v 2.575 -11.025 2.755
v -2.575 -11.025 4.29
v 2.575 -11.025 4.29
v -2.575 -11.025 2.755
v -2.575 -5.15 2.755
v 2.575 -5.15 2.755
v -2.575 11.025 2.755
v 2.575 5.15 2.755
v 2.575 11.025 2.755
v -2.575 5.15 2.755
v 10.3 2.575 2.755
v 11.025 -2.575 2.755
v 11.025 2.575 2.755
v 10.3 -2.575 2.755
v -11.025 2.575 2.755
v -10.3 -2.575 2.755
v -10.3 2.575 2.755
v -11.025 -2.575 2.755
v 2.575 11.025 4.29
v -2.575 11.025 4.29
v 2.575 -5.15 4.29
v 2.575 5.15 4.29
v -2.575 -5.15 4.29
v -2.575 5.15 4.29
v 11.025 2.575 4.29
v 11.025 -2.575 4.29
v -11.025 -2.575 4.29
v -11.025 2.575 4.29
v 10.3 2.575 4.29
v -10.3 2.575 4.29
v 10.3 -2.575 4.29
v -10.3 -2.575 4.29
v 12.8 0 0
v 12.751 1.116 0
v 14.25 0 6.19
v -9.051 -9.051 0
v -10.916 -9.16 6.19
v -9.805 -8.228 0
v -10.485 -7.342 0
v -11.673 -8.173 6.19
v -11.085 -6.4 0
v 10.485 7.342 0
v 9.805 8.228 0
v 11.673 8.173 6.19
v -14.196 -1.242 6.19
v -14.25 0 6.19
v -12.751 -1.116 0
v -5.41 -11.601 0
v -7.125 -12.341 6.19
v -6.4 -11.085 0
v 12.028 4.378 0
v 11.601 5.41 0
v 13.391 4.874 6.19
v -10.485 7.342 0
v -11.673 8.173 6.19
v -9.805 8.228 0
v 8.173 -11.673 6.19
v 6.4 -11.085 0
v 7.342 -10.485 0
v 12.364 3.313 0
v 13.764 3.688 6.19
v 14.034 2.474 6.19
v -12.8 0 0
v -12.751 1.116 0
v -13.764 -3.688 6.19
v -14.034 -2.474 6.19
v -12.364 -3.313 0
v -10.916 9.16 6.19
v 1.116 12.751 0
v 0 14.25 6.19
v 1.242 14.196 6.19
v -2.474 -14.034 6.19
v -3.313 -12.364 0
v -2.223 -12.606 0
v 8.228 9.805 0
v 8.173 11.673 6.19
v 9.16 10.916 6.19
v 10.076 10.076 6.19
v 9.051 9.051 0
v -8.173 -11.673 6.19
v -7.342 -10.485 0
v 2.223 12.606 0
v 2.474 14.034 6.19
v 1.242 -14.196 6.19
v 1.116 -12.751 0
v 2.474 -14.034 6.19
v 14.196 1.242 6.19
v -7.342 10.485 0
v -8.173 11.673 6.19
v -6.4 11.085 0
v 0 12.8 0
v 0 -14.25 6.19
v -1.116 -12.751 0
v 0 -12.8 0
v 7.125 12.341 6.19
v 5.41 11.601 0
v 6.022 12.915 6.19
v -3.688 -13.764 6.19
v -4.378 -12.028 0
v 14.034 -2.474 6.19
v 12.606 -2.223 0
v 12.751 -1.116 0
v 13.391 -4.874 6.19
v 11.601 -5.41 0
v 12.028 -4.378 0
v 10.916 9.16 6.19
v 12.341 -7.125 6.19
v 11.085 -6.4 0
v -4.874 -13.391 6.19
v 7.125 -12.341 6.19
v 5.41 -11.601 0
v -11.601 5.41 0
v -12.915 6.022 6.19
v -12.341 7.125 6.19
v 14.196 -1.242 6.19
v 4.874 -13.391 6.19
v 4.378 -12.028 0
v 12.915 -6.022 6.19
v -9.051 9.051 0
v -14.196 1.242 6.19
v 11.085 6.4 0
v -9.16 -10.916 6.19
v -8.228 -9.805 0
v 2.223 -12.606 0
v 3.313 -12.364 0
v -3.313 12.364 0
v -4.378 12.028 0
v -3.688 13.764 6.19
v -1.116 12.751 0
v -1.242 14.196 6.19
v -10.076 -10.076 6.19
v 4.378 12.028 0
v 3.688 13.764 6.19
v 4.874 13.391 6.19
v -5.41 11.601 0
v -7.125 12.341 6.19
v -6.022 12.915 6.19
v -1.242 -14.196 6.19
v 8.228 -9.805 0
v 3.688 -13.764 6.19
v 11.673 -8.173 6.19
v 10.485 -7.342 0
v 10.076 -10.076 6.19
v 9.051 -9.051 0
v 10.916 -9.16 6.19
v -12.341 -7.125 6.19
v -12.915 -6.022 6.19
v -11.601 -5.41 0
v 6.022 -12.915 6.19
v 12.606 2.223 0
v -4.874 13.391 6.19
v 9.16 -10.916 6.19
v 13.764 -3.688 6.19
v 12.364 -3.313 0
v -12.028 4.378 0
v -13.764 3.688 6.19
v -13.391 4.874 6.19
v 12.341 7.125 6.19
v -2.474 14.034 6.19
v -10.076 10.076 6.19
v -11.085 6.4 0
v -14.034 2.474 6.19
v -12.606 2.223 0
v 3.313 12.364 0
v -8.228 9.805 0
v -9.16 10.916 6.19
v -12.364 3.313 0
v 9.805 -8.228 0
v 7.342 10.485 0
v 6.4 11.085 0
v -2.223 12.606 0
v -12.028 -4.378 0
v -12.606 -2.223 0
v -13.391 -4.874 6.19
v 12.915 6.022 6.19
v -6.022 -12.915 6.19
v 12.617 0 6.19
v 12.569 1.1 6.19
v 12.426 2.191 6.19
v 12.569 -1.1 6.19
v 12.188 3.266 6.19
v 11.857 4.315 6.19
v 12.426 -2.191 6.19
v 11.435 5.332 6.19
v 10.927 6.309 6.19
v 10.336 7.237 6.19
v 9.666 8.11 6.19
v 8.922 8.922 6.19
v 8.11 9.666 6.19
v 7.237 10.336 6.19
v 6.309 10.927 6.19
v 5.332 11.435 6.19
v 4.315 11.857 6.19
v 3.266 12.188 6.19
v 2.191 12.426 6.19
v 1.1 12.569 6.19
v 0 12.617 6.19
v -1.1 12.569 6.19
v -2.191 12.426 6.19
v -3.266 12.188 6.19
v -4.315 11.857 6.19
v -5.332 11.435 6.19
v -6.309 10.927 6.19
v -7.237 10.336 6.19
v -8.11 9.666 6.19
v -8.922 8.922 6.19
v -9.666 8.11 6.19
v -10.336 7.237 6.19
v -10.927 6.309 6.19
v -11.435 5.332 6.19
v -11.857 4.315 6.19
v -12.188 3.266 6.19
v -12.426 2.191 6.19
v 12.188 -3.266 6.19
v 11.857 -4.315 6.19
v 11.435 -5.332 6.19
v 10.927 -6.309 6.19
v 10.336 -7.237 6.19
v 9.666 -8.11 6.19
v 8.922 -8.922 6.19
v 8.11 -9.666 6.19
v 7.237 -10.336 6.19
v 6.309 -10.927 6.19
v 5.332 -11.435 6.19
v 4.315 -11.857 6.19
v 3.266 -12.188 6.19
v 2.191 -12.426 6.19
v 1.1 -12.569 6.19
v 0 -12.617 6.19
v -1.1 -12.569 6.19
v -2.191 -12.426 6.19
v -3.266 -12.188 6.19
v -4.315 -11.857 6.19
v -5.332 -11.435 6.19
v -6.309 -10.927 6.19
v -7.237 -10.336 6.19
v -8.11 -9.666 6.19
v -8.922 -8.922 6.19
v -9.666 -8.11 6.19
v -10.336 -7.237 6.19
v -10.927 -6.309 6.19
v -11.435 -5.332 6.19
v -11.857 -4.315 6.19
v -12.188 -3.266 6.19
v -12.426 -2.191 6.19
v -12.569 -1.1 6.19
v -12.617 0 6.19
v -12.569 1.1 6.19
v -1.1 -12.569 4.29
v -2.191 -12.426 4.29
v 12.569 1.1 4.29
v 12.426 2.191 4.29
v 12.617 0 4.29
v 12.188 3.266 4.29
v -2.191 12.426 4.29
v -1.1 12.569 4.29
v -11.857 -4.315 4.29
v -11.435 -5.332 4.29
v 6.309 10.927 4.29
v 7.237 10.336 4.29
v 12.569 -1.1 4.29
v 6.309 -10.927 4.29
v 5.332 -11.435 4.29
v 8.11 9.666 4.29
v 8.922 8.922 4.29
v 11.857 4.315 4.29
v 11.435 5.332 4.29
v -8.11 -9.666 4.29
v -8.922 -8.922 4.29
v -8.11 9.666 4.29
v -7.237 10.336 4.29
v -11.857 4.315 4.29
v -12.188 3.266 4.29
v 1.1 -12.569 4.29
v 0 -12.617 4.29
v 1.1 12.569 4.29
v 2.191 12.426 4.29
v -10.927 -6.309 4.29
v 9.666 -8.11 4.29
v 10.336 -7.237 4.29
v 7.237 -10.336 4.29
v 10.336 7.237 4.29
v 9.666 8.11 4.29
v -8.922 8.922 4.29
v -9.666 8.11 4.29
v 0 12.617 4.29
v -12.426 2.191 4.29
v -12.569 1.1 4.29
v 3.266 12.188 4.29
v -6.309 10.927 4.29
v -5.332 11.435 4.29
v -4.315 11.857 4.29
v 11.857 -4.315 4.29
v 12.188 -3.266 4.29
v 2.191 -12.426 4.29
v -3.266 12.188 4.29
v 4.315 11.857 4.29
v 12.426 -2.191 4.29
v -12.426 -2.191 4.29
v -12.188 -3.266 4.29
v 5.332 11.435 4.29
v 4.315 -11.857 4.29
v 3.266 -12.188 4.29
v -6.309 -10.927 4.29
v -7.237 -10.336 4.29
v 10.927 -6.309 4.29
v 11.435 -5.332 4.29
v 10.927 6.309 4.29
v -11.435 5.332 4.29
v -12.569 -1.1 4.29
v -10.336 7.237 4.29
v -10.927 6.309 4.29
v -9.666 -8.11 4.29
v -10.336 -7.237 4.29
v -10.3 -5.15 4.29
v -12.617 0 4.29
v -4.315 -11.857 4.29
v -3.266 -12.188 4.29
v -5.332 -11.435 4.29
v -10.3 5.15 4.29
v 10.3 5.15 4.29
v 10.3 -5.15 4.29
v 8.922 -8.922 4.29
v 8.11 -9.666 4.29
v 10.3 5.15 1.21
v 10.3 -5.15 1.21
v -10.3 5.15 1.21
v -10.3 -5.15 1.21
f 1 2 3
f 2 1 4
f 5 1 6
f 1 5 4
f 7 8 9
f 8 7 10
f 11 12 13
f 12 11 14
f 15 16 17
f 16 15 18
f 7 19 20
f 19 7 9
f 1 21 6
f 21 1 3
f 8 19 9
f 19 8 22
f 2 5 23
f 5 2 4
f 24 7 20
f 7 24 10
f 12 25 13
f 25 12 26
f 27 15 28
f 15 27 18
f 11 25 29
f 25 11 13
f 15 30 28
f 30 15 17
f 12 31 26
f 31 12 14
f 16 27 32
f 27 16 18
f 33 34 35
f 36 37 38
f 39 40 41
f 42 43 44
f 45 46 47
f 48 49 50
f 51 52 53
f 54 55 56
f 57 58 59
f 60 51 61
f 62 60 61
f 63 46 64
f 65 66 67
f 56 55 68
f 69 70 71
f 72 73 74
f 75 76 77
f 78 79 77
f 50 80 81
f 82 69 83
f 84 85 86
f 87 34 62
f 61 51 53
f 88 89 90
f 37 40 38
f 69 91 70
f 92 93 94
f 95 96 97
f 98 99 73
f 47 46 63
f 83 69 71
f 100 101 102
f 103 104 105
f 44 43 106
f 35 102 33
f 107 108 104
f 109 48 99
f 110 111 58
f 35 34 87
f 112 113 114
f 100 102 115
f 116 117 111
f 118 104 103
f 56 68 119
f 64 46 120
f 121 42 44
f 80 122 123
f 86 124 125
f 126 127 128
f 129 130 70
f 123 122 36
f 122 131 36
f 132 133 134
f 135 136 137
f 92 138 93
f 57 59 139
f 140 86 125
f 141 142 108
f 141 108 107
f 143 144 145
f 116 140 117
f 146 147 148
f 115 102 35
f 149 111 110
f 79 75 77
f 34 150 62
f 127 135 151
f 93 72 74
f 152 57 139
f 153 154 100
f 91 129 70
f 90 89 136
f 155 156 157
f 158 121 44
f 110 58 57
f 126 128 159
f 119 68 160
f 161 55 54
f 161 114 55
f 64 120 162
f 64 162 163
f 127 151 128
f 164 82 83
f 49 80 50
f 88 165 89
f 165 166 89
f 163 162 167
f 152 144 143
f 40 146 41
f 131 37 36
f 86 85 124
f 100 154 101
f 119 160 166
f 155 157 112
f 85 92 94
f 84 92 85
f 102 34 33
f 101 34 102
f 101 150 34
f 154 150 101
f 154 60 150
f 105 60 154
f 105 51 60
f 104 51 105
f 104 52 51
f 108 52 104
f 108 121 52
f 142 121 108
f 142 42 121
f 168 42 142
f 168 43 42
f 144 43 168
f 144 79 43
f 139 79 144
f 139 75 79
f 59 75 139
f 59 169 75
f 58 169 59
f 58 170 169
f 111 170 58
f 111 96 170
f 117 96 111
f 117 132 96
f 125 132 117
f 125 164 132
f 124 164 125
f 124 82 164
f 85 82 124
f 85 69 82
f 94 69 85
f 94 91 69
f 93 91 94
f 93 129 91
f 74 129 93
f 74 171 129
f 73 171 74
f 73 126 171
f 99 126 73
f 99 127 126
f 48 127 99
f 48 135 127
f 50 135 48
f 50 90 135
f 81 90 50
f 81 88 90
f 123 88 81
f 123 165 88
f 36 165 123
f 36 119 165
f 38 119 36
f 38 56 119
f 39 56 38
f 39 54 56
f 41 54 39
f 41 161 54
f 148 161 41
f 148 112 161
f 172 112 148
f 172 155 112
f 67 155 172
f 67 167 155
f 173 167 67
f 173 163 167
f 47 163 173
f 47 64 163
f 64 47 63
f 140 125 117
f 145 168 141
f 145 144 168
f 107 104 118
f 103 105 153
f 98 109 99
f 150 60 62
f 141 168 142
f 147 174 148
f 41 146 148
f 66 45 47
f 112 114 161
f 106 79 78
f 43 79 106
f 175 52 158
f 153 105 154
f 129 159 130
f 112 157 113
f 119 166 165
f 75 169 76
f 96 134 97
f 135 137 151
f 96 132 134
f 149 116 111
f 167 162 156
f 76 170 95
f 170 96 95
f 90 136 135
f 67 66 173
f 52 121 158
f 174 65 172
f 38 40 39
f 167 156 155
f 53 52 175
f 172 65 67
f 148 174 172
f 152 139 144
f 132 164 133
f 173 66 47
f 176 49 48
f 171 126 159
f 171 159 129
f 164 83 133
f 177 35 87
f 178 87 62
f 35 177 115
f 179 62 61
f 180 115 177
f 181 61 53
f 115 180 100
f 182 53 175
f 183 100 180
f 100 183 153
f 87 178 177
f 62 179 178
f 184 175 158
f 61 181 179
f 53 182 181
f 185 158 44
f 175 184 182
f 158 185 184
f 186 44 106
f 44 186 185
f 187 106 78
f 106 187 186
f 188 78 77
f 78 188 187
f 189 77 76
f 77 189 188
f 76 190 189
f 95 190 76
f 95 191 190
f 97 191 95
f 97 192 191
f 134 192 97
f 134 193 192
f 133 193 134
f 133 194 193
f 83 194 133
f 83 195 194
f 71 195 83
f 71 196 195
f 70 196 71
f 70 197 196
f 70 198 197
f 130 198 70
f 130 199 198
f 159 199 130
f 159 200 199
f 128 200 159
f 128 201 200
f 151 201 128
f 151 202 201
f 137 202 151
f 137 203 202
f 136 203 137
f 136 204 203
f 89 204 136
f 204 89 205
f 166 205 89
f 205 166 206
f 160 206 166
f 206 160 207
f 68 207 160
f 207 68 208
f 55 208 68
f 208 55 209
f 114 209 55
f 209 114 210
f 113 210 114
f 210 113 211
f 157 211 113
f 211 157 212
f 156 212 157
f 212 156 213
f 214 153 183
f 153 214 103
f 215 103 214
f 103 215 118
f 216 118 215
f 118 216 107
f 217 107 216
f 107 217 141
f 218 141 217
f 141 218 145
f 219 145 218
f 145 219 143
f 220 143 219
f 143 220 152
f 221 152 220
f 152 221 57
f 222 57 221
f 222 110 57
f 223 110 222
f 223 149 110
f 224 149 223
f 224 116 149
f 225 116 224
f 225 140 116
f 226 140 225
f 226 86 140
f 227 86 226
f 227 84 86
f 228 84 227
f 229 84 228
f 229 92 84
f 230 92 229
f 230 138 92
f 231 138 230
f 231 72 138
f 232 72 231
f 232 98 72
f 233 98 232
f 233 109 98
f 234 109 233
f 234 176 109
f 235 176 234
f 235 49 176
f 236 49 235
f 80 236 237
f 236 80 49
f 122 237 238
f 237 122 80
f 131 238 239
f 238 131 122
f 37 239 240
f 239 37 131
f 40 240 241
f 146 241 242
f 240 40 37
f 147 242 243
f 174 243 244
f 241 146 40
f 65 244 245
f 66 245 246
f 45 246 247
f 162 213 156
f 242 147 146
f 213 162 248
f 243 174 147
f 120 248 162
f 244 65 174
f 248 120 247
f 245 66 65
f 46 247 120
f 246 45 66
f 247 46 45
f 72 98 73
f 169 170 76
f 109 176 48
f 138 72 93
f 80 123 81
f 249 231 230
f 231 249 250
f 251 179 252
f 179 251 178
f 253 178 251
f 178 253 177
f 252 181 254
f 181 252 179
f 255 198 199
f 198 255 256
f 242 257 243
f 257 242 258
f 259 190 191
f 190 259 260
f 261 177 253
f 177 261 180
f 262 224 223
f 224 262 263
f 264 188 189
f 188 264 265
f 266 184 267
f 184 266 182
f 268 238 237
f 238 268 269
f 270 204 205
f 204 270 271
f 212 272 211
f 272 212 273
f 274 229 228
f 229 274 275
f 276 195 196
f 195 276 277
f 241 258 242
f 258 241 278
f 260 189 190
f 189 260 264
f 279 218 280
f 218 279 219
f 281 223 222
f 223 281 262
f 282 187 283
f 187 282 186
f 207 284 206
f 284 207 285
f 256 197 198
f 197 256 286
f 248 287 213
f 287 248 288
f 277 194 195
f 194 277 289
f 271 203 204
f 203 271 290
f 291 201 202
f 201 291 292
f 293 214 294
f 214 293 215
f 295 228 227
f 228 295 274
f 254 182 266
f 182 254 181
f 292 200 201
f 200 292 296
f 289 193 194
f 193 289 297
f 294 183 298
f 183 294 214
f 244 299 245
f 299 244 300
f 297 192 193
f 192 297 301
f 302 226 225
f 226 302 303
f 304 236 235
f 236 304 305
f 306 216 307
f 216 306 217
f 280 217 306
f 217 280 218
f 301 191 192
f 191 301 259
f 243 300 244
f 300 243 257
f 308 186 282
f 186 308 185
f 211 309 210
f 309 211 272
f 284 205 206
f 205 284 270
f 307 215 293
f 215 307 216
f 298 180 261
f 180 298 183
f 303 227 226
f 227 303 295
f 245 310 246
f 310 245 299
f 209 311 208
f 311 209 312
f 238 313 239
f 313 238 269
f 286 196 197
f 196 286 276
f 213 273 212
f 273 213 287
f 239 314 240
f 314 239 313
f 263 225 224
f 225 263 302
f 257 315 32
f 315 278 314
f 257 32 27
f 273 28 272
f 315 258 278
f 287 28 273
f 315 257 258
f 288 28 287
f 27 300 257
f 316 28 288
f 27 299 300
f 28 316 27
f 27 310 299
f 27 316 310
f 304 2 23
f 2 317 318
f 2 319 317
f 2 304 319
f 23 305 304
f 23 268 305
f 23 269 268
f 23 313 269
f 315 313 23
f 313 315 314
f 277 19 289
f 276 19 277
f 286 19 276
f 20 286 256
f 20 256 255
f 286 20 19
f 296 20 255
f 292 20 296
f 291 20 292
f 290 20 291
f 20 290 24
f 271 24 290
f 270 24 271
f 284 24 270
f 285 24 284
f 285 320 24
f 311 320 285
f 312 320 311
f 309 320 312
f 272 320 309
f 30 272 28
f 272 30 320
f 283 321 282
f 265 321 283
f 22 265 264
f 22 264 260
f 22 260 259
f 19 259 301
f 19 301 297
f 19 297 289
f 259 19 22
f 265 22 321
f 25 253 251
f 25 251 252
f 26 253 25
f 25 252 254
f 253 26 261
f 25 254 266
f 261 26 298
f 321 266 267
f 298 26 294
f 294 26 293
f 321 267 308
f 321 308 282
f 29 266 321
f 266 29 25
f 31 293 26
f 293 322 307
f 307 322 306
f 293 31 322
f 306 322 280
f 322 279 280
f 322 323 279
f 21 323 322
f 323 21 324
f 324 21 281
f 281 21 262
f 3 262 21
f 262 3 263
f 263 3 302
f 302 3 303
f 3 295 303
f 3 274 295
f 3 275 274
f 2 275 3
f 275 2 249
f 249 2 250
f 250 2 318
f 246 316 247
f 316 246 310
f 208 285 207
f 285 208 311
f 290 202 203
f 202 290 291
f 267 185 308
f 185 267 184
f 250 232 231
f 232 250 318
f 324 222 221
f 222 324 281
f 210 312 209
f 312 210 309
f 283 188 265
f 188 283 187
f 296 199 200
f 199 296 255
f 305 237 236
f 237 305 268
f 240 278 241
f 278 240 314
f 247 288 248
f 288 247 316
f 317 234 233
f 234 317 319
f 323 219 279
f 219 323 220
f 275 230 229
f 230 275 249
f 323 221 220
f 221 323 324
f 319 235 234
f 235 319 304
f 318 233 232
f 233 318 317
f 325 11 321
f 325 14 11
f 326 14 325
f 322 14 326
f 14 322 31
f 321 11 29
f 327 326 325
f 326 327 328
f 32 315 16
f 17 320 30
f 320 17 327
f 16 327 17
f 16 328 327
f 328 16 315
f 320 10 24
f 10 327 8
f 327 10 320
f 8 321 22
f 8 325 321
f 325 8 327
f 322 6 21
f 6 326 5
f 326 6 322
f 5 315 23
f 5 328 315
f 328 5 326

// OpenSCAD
/*
Coin Magnet Holder
Version 3 - 26 July 2015
Created by Aaron Ciuffo - txoof.com

This SCAD can produce a plate with many coins.  See the example at the bottom.

Many coins are already available; add more using this format:
//ISO4217_name<value>=[Diameter, Thickness]

Check the examples below.

To draw a single coin holder call (the function expects a list of lists)
  drawCoinHolder([[coinDiameter, coinThickness]]);
  

To draw a plate of several holders call:
  drawCoinHolder([coinvar1, coinvar2, coinvar3]);

!!!NOTE!!! the largest coin must be the first item in the list!



Adjust the magnet variables for your particlar magnet.  If your magnet does not
quite fit after printing, adjust the 'ovr' variable in the Tweaks section.



*/

/* [Variables] */

//Coin Diameter
coinDia=24.5;
//Coin Thickness
coinThick=1.9;


/*[Design]*/
//Border around coin
border=2;


/*[Magnet Dimensions]*/
//Magnet X - Longest dimension
magnetX=20;
//Magnet Y
magnetY=10;
//Magnet Z
magnetZ=3;
//Magnet Base Base Thickness
baseThick=1.2;

/*[Layout]*/
separation=5;

/*[Tweak]*/
//You may need to tweak this if you find your magnets do not fit.  
//Increase this variable to make more space, decrease it to make fits more tight.
ovr=1.03;

/*[Hidden]*/
magX=magnetX*ovr;
magY=magnetY*ovr;
magZ=magnetZ*ovr;

//Canadian dollar - CAD
cad1=[26.5, 2];
cad2=[27.95, 1.75];
cadp25=[24, 1.6];

//French Community of Africa - CFA
cfa10=[23.5, 1.5];
cfa50=[22, 1.7];
cfa200=[24.5, 1.9];

//Danish krone - DKK
dkk5=[28.5, 2];

//Spanish Pesetas - ESP
esp100=[24.5, 2.9];

//French franc - FRF
frf1=[24,1.9];

//Great Britian Pound - GBP
gbpp02=[26, 2.1];

//Greek drachma - GRD
grd50=[27.5, 2.2];
grd100=[29.5, 2.2];

//Icelanding Krone ISK
isk100=[25.6, 2.3];
isk50=[23.05, 2.7]; 
isk10=[27.55, 1.8];
isk5=[24.55, 1.8];
isk1=[21.5, 1.7];

//Irsih pound - IEP
iepp02=[26, 2];
iepp20=[27.1, 2];
//non round! - distance from point/point (even sided), or point/flat (odd sided)
iepp50=[30.5, 2.5, 7];
iep1=[31.1, 1.9];


//Italian lira - ITL
itl200=[24, 1.7];

//Lebanese pound - LBP
lbp500=[24.5, 2.15];

//Mexican Peso - MXN
mxn10=[28, 2.3];

//Dutch guilder - NLG
nlg1=[24.5, 1.9];

//Norwegian kroner - NOK
nok1=[21, 1.7];
nok5=[26, 2.15];
nok10=[24, 2.5];
nok20=[27.55, 2.5];

//Thai baht - THB
thb5=[24, 2.2];

//Turkish lira - TRY
try1=[26.25, 2];
tryp5=[23.9, 2];

//United States dollar - USD
usdp25=[24.3, 1.75];
usd1=[26.5, 2.1];



module drawCoinHolder(coinDim) {
  coinD=coinDim[0];
  coinZ=coinDim[1];
  cutOvr=.01; //add a little bit to fight ZFighting
  magBorder=5; //Consider calculating this form something or other
  $fn=72;
  height=coinZ+magZ+baseThick;
  difference() {
    //create external cone - add 
    cylinder(h=height, 
      r2=(coinD+(border*2))/2,  
      r1=(magX+magBorder)/2);

    //cut void for coin
    translate([0, 0, coinZ+magZ+baseThick-coinZ])
      color("red")
      cylinder(h=coinZ+cutOvr, r=coinD*ovr/2);

    //cut void for magnet
    translate([0, 0, magZ/2+baseThick+cutOvr])
      color("blue")
      cube([magX, magY, magZ], center=true);
    
    //cut void for glue grooves
    groove=[coinD*.9, magY*.5, magZ*.5];
    for (i=[-1, 0]) {
      rotate([0, 0, 90*i])
        color("yellow")
        translate([0, 0, height-coinZ-groove[2]/2+cutOvr])
        cube(groove, center=true);
    }

  }

}

module draw_nonround_holder(coinDim) {
  coinT=coinDim[1];
  coinSides=coinDim[2];
  coinD=2*(coinDim[0]/(cos((360/(2*coinSides)))+1));
  echo(coinD);
  difference () {
    // create external cylinder
    cylinder(h=coinT+magZ+.9, r2=(coinD+4)/2,  r1=((coinD+2.5)/2)*.8, $fn=36); 
    // cut out internal space for coin
    translate([0,0,magZ+.9]) cylinder(h=coinT*3, r=(coinD+.7)/2, $fn=coinSides);
    // cut out slot for magnet
    translate([-magX/2,-magY/2,.5]) cube([magX+.3, magY+.3, magZ*5]);
    // grooves for holding a bit of hot glue
    translate([0,0,(magZ*1.5)-.2]) cube([coinD*.8, magY*.2, magZ], center=true);
    translate([0,0,(magZ*1.5)-.2]) cube([magX*.2, coinD*.8, magZ], center=true);


  }
}

module layout(coins) {
  //find the largest coin in the list
  //BLAH!  This does not work. max([[a, b], [q, r]]) always returns element 0.
  //maxCoin=max(coins);

  maxCoin=coins[0];
  gridUnit=((maxCoin[0]+separation));

  //check to see if the number of coins in the list is square
  sqrTest=sqrt(len(coins))-floor(sqrt(len(coins)));

  //assign the next closest square number if it is not
  closestSq = sqrTest > 0 ? floor(sqrt(len(coins))+1) : sqrt(len(coins));
  
  //center the coins around the origin
  translate([-gridUnit*(closestSq-1)*.5, -gridUnit*(closestSq-1)*.5, 0])
  //work across the row, then the column  
  for (row = [0:closestSq-1]) {
    for(col = [0:closestSq-1]) {
      translate([gridUnit*col, gridUnit*row, 0])
        if (row*closestSq+col  <= len(coins)-1 ) {
          //determine the index number of the coin array
          drawCoinHolder(coins[row*closestSq+col]);
        } 
    }
  }

}

//layout([isk10, usd1, nok5, cfa50, gbpp02, nlg1, mxn10, esp100, usdp25]);

//layout([isk10, isk50, isk5, isk100]);

//layout([isk10, isk10, isk10, isk10]);

layout([[coinDia, coinThick]]);
